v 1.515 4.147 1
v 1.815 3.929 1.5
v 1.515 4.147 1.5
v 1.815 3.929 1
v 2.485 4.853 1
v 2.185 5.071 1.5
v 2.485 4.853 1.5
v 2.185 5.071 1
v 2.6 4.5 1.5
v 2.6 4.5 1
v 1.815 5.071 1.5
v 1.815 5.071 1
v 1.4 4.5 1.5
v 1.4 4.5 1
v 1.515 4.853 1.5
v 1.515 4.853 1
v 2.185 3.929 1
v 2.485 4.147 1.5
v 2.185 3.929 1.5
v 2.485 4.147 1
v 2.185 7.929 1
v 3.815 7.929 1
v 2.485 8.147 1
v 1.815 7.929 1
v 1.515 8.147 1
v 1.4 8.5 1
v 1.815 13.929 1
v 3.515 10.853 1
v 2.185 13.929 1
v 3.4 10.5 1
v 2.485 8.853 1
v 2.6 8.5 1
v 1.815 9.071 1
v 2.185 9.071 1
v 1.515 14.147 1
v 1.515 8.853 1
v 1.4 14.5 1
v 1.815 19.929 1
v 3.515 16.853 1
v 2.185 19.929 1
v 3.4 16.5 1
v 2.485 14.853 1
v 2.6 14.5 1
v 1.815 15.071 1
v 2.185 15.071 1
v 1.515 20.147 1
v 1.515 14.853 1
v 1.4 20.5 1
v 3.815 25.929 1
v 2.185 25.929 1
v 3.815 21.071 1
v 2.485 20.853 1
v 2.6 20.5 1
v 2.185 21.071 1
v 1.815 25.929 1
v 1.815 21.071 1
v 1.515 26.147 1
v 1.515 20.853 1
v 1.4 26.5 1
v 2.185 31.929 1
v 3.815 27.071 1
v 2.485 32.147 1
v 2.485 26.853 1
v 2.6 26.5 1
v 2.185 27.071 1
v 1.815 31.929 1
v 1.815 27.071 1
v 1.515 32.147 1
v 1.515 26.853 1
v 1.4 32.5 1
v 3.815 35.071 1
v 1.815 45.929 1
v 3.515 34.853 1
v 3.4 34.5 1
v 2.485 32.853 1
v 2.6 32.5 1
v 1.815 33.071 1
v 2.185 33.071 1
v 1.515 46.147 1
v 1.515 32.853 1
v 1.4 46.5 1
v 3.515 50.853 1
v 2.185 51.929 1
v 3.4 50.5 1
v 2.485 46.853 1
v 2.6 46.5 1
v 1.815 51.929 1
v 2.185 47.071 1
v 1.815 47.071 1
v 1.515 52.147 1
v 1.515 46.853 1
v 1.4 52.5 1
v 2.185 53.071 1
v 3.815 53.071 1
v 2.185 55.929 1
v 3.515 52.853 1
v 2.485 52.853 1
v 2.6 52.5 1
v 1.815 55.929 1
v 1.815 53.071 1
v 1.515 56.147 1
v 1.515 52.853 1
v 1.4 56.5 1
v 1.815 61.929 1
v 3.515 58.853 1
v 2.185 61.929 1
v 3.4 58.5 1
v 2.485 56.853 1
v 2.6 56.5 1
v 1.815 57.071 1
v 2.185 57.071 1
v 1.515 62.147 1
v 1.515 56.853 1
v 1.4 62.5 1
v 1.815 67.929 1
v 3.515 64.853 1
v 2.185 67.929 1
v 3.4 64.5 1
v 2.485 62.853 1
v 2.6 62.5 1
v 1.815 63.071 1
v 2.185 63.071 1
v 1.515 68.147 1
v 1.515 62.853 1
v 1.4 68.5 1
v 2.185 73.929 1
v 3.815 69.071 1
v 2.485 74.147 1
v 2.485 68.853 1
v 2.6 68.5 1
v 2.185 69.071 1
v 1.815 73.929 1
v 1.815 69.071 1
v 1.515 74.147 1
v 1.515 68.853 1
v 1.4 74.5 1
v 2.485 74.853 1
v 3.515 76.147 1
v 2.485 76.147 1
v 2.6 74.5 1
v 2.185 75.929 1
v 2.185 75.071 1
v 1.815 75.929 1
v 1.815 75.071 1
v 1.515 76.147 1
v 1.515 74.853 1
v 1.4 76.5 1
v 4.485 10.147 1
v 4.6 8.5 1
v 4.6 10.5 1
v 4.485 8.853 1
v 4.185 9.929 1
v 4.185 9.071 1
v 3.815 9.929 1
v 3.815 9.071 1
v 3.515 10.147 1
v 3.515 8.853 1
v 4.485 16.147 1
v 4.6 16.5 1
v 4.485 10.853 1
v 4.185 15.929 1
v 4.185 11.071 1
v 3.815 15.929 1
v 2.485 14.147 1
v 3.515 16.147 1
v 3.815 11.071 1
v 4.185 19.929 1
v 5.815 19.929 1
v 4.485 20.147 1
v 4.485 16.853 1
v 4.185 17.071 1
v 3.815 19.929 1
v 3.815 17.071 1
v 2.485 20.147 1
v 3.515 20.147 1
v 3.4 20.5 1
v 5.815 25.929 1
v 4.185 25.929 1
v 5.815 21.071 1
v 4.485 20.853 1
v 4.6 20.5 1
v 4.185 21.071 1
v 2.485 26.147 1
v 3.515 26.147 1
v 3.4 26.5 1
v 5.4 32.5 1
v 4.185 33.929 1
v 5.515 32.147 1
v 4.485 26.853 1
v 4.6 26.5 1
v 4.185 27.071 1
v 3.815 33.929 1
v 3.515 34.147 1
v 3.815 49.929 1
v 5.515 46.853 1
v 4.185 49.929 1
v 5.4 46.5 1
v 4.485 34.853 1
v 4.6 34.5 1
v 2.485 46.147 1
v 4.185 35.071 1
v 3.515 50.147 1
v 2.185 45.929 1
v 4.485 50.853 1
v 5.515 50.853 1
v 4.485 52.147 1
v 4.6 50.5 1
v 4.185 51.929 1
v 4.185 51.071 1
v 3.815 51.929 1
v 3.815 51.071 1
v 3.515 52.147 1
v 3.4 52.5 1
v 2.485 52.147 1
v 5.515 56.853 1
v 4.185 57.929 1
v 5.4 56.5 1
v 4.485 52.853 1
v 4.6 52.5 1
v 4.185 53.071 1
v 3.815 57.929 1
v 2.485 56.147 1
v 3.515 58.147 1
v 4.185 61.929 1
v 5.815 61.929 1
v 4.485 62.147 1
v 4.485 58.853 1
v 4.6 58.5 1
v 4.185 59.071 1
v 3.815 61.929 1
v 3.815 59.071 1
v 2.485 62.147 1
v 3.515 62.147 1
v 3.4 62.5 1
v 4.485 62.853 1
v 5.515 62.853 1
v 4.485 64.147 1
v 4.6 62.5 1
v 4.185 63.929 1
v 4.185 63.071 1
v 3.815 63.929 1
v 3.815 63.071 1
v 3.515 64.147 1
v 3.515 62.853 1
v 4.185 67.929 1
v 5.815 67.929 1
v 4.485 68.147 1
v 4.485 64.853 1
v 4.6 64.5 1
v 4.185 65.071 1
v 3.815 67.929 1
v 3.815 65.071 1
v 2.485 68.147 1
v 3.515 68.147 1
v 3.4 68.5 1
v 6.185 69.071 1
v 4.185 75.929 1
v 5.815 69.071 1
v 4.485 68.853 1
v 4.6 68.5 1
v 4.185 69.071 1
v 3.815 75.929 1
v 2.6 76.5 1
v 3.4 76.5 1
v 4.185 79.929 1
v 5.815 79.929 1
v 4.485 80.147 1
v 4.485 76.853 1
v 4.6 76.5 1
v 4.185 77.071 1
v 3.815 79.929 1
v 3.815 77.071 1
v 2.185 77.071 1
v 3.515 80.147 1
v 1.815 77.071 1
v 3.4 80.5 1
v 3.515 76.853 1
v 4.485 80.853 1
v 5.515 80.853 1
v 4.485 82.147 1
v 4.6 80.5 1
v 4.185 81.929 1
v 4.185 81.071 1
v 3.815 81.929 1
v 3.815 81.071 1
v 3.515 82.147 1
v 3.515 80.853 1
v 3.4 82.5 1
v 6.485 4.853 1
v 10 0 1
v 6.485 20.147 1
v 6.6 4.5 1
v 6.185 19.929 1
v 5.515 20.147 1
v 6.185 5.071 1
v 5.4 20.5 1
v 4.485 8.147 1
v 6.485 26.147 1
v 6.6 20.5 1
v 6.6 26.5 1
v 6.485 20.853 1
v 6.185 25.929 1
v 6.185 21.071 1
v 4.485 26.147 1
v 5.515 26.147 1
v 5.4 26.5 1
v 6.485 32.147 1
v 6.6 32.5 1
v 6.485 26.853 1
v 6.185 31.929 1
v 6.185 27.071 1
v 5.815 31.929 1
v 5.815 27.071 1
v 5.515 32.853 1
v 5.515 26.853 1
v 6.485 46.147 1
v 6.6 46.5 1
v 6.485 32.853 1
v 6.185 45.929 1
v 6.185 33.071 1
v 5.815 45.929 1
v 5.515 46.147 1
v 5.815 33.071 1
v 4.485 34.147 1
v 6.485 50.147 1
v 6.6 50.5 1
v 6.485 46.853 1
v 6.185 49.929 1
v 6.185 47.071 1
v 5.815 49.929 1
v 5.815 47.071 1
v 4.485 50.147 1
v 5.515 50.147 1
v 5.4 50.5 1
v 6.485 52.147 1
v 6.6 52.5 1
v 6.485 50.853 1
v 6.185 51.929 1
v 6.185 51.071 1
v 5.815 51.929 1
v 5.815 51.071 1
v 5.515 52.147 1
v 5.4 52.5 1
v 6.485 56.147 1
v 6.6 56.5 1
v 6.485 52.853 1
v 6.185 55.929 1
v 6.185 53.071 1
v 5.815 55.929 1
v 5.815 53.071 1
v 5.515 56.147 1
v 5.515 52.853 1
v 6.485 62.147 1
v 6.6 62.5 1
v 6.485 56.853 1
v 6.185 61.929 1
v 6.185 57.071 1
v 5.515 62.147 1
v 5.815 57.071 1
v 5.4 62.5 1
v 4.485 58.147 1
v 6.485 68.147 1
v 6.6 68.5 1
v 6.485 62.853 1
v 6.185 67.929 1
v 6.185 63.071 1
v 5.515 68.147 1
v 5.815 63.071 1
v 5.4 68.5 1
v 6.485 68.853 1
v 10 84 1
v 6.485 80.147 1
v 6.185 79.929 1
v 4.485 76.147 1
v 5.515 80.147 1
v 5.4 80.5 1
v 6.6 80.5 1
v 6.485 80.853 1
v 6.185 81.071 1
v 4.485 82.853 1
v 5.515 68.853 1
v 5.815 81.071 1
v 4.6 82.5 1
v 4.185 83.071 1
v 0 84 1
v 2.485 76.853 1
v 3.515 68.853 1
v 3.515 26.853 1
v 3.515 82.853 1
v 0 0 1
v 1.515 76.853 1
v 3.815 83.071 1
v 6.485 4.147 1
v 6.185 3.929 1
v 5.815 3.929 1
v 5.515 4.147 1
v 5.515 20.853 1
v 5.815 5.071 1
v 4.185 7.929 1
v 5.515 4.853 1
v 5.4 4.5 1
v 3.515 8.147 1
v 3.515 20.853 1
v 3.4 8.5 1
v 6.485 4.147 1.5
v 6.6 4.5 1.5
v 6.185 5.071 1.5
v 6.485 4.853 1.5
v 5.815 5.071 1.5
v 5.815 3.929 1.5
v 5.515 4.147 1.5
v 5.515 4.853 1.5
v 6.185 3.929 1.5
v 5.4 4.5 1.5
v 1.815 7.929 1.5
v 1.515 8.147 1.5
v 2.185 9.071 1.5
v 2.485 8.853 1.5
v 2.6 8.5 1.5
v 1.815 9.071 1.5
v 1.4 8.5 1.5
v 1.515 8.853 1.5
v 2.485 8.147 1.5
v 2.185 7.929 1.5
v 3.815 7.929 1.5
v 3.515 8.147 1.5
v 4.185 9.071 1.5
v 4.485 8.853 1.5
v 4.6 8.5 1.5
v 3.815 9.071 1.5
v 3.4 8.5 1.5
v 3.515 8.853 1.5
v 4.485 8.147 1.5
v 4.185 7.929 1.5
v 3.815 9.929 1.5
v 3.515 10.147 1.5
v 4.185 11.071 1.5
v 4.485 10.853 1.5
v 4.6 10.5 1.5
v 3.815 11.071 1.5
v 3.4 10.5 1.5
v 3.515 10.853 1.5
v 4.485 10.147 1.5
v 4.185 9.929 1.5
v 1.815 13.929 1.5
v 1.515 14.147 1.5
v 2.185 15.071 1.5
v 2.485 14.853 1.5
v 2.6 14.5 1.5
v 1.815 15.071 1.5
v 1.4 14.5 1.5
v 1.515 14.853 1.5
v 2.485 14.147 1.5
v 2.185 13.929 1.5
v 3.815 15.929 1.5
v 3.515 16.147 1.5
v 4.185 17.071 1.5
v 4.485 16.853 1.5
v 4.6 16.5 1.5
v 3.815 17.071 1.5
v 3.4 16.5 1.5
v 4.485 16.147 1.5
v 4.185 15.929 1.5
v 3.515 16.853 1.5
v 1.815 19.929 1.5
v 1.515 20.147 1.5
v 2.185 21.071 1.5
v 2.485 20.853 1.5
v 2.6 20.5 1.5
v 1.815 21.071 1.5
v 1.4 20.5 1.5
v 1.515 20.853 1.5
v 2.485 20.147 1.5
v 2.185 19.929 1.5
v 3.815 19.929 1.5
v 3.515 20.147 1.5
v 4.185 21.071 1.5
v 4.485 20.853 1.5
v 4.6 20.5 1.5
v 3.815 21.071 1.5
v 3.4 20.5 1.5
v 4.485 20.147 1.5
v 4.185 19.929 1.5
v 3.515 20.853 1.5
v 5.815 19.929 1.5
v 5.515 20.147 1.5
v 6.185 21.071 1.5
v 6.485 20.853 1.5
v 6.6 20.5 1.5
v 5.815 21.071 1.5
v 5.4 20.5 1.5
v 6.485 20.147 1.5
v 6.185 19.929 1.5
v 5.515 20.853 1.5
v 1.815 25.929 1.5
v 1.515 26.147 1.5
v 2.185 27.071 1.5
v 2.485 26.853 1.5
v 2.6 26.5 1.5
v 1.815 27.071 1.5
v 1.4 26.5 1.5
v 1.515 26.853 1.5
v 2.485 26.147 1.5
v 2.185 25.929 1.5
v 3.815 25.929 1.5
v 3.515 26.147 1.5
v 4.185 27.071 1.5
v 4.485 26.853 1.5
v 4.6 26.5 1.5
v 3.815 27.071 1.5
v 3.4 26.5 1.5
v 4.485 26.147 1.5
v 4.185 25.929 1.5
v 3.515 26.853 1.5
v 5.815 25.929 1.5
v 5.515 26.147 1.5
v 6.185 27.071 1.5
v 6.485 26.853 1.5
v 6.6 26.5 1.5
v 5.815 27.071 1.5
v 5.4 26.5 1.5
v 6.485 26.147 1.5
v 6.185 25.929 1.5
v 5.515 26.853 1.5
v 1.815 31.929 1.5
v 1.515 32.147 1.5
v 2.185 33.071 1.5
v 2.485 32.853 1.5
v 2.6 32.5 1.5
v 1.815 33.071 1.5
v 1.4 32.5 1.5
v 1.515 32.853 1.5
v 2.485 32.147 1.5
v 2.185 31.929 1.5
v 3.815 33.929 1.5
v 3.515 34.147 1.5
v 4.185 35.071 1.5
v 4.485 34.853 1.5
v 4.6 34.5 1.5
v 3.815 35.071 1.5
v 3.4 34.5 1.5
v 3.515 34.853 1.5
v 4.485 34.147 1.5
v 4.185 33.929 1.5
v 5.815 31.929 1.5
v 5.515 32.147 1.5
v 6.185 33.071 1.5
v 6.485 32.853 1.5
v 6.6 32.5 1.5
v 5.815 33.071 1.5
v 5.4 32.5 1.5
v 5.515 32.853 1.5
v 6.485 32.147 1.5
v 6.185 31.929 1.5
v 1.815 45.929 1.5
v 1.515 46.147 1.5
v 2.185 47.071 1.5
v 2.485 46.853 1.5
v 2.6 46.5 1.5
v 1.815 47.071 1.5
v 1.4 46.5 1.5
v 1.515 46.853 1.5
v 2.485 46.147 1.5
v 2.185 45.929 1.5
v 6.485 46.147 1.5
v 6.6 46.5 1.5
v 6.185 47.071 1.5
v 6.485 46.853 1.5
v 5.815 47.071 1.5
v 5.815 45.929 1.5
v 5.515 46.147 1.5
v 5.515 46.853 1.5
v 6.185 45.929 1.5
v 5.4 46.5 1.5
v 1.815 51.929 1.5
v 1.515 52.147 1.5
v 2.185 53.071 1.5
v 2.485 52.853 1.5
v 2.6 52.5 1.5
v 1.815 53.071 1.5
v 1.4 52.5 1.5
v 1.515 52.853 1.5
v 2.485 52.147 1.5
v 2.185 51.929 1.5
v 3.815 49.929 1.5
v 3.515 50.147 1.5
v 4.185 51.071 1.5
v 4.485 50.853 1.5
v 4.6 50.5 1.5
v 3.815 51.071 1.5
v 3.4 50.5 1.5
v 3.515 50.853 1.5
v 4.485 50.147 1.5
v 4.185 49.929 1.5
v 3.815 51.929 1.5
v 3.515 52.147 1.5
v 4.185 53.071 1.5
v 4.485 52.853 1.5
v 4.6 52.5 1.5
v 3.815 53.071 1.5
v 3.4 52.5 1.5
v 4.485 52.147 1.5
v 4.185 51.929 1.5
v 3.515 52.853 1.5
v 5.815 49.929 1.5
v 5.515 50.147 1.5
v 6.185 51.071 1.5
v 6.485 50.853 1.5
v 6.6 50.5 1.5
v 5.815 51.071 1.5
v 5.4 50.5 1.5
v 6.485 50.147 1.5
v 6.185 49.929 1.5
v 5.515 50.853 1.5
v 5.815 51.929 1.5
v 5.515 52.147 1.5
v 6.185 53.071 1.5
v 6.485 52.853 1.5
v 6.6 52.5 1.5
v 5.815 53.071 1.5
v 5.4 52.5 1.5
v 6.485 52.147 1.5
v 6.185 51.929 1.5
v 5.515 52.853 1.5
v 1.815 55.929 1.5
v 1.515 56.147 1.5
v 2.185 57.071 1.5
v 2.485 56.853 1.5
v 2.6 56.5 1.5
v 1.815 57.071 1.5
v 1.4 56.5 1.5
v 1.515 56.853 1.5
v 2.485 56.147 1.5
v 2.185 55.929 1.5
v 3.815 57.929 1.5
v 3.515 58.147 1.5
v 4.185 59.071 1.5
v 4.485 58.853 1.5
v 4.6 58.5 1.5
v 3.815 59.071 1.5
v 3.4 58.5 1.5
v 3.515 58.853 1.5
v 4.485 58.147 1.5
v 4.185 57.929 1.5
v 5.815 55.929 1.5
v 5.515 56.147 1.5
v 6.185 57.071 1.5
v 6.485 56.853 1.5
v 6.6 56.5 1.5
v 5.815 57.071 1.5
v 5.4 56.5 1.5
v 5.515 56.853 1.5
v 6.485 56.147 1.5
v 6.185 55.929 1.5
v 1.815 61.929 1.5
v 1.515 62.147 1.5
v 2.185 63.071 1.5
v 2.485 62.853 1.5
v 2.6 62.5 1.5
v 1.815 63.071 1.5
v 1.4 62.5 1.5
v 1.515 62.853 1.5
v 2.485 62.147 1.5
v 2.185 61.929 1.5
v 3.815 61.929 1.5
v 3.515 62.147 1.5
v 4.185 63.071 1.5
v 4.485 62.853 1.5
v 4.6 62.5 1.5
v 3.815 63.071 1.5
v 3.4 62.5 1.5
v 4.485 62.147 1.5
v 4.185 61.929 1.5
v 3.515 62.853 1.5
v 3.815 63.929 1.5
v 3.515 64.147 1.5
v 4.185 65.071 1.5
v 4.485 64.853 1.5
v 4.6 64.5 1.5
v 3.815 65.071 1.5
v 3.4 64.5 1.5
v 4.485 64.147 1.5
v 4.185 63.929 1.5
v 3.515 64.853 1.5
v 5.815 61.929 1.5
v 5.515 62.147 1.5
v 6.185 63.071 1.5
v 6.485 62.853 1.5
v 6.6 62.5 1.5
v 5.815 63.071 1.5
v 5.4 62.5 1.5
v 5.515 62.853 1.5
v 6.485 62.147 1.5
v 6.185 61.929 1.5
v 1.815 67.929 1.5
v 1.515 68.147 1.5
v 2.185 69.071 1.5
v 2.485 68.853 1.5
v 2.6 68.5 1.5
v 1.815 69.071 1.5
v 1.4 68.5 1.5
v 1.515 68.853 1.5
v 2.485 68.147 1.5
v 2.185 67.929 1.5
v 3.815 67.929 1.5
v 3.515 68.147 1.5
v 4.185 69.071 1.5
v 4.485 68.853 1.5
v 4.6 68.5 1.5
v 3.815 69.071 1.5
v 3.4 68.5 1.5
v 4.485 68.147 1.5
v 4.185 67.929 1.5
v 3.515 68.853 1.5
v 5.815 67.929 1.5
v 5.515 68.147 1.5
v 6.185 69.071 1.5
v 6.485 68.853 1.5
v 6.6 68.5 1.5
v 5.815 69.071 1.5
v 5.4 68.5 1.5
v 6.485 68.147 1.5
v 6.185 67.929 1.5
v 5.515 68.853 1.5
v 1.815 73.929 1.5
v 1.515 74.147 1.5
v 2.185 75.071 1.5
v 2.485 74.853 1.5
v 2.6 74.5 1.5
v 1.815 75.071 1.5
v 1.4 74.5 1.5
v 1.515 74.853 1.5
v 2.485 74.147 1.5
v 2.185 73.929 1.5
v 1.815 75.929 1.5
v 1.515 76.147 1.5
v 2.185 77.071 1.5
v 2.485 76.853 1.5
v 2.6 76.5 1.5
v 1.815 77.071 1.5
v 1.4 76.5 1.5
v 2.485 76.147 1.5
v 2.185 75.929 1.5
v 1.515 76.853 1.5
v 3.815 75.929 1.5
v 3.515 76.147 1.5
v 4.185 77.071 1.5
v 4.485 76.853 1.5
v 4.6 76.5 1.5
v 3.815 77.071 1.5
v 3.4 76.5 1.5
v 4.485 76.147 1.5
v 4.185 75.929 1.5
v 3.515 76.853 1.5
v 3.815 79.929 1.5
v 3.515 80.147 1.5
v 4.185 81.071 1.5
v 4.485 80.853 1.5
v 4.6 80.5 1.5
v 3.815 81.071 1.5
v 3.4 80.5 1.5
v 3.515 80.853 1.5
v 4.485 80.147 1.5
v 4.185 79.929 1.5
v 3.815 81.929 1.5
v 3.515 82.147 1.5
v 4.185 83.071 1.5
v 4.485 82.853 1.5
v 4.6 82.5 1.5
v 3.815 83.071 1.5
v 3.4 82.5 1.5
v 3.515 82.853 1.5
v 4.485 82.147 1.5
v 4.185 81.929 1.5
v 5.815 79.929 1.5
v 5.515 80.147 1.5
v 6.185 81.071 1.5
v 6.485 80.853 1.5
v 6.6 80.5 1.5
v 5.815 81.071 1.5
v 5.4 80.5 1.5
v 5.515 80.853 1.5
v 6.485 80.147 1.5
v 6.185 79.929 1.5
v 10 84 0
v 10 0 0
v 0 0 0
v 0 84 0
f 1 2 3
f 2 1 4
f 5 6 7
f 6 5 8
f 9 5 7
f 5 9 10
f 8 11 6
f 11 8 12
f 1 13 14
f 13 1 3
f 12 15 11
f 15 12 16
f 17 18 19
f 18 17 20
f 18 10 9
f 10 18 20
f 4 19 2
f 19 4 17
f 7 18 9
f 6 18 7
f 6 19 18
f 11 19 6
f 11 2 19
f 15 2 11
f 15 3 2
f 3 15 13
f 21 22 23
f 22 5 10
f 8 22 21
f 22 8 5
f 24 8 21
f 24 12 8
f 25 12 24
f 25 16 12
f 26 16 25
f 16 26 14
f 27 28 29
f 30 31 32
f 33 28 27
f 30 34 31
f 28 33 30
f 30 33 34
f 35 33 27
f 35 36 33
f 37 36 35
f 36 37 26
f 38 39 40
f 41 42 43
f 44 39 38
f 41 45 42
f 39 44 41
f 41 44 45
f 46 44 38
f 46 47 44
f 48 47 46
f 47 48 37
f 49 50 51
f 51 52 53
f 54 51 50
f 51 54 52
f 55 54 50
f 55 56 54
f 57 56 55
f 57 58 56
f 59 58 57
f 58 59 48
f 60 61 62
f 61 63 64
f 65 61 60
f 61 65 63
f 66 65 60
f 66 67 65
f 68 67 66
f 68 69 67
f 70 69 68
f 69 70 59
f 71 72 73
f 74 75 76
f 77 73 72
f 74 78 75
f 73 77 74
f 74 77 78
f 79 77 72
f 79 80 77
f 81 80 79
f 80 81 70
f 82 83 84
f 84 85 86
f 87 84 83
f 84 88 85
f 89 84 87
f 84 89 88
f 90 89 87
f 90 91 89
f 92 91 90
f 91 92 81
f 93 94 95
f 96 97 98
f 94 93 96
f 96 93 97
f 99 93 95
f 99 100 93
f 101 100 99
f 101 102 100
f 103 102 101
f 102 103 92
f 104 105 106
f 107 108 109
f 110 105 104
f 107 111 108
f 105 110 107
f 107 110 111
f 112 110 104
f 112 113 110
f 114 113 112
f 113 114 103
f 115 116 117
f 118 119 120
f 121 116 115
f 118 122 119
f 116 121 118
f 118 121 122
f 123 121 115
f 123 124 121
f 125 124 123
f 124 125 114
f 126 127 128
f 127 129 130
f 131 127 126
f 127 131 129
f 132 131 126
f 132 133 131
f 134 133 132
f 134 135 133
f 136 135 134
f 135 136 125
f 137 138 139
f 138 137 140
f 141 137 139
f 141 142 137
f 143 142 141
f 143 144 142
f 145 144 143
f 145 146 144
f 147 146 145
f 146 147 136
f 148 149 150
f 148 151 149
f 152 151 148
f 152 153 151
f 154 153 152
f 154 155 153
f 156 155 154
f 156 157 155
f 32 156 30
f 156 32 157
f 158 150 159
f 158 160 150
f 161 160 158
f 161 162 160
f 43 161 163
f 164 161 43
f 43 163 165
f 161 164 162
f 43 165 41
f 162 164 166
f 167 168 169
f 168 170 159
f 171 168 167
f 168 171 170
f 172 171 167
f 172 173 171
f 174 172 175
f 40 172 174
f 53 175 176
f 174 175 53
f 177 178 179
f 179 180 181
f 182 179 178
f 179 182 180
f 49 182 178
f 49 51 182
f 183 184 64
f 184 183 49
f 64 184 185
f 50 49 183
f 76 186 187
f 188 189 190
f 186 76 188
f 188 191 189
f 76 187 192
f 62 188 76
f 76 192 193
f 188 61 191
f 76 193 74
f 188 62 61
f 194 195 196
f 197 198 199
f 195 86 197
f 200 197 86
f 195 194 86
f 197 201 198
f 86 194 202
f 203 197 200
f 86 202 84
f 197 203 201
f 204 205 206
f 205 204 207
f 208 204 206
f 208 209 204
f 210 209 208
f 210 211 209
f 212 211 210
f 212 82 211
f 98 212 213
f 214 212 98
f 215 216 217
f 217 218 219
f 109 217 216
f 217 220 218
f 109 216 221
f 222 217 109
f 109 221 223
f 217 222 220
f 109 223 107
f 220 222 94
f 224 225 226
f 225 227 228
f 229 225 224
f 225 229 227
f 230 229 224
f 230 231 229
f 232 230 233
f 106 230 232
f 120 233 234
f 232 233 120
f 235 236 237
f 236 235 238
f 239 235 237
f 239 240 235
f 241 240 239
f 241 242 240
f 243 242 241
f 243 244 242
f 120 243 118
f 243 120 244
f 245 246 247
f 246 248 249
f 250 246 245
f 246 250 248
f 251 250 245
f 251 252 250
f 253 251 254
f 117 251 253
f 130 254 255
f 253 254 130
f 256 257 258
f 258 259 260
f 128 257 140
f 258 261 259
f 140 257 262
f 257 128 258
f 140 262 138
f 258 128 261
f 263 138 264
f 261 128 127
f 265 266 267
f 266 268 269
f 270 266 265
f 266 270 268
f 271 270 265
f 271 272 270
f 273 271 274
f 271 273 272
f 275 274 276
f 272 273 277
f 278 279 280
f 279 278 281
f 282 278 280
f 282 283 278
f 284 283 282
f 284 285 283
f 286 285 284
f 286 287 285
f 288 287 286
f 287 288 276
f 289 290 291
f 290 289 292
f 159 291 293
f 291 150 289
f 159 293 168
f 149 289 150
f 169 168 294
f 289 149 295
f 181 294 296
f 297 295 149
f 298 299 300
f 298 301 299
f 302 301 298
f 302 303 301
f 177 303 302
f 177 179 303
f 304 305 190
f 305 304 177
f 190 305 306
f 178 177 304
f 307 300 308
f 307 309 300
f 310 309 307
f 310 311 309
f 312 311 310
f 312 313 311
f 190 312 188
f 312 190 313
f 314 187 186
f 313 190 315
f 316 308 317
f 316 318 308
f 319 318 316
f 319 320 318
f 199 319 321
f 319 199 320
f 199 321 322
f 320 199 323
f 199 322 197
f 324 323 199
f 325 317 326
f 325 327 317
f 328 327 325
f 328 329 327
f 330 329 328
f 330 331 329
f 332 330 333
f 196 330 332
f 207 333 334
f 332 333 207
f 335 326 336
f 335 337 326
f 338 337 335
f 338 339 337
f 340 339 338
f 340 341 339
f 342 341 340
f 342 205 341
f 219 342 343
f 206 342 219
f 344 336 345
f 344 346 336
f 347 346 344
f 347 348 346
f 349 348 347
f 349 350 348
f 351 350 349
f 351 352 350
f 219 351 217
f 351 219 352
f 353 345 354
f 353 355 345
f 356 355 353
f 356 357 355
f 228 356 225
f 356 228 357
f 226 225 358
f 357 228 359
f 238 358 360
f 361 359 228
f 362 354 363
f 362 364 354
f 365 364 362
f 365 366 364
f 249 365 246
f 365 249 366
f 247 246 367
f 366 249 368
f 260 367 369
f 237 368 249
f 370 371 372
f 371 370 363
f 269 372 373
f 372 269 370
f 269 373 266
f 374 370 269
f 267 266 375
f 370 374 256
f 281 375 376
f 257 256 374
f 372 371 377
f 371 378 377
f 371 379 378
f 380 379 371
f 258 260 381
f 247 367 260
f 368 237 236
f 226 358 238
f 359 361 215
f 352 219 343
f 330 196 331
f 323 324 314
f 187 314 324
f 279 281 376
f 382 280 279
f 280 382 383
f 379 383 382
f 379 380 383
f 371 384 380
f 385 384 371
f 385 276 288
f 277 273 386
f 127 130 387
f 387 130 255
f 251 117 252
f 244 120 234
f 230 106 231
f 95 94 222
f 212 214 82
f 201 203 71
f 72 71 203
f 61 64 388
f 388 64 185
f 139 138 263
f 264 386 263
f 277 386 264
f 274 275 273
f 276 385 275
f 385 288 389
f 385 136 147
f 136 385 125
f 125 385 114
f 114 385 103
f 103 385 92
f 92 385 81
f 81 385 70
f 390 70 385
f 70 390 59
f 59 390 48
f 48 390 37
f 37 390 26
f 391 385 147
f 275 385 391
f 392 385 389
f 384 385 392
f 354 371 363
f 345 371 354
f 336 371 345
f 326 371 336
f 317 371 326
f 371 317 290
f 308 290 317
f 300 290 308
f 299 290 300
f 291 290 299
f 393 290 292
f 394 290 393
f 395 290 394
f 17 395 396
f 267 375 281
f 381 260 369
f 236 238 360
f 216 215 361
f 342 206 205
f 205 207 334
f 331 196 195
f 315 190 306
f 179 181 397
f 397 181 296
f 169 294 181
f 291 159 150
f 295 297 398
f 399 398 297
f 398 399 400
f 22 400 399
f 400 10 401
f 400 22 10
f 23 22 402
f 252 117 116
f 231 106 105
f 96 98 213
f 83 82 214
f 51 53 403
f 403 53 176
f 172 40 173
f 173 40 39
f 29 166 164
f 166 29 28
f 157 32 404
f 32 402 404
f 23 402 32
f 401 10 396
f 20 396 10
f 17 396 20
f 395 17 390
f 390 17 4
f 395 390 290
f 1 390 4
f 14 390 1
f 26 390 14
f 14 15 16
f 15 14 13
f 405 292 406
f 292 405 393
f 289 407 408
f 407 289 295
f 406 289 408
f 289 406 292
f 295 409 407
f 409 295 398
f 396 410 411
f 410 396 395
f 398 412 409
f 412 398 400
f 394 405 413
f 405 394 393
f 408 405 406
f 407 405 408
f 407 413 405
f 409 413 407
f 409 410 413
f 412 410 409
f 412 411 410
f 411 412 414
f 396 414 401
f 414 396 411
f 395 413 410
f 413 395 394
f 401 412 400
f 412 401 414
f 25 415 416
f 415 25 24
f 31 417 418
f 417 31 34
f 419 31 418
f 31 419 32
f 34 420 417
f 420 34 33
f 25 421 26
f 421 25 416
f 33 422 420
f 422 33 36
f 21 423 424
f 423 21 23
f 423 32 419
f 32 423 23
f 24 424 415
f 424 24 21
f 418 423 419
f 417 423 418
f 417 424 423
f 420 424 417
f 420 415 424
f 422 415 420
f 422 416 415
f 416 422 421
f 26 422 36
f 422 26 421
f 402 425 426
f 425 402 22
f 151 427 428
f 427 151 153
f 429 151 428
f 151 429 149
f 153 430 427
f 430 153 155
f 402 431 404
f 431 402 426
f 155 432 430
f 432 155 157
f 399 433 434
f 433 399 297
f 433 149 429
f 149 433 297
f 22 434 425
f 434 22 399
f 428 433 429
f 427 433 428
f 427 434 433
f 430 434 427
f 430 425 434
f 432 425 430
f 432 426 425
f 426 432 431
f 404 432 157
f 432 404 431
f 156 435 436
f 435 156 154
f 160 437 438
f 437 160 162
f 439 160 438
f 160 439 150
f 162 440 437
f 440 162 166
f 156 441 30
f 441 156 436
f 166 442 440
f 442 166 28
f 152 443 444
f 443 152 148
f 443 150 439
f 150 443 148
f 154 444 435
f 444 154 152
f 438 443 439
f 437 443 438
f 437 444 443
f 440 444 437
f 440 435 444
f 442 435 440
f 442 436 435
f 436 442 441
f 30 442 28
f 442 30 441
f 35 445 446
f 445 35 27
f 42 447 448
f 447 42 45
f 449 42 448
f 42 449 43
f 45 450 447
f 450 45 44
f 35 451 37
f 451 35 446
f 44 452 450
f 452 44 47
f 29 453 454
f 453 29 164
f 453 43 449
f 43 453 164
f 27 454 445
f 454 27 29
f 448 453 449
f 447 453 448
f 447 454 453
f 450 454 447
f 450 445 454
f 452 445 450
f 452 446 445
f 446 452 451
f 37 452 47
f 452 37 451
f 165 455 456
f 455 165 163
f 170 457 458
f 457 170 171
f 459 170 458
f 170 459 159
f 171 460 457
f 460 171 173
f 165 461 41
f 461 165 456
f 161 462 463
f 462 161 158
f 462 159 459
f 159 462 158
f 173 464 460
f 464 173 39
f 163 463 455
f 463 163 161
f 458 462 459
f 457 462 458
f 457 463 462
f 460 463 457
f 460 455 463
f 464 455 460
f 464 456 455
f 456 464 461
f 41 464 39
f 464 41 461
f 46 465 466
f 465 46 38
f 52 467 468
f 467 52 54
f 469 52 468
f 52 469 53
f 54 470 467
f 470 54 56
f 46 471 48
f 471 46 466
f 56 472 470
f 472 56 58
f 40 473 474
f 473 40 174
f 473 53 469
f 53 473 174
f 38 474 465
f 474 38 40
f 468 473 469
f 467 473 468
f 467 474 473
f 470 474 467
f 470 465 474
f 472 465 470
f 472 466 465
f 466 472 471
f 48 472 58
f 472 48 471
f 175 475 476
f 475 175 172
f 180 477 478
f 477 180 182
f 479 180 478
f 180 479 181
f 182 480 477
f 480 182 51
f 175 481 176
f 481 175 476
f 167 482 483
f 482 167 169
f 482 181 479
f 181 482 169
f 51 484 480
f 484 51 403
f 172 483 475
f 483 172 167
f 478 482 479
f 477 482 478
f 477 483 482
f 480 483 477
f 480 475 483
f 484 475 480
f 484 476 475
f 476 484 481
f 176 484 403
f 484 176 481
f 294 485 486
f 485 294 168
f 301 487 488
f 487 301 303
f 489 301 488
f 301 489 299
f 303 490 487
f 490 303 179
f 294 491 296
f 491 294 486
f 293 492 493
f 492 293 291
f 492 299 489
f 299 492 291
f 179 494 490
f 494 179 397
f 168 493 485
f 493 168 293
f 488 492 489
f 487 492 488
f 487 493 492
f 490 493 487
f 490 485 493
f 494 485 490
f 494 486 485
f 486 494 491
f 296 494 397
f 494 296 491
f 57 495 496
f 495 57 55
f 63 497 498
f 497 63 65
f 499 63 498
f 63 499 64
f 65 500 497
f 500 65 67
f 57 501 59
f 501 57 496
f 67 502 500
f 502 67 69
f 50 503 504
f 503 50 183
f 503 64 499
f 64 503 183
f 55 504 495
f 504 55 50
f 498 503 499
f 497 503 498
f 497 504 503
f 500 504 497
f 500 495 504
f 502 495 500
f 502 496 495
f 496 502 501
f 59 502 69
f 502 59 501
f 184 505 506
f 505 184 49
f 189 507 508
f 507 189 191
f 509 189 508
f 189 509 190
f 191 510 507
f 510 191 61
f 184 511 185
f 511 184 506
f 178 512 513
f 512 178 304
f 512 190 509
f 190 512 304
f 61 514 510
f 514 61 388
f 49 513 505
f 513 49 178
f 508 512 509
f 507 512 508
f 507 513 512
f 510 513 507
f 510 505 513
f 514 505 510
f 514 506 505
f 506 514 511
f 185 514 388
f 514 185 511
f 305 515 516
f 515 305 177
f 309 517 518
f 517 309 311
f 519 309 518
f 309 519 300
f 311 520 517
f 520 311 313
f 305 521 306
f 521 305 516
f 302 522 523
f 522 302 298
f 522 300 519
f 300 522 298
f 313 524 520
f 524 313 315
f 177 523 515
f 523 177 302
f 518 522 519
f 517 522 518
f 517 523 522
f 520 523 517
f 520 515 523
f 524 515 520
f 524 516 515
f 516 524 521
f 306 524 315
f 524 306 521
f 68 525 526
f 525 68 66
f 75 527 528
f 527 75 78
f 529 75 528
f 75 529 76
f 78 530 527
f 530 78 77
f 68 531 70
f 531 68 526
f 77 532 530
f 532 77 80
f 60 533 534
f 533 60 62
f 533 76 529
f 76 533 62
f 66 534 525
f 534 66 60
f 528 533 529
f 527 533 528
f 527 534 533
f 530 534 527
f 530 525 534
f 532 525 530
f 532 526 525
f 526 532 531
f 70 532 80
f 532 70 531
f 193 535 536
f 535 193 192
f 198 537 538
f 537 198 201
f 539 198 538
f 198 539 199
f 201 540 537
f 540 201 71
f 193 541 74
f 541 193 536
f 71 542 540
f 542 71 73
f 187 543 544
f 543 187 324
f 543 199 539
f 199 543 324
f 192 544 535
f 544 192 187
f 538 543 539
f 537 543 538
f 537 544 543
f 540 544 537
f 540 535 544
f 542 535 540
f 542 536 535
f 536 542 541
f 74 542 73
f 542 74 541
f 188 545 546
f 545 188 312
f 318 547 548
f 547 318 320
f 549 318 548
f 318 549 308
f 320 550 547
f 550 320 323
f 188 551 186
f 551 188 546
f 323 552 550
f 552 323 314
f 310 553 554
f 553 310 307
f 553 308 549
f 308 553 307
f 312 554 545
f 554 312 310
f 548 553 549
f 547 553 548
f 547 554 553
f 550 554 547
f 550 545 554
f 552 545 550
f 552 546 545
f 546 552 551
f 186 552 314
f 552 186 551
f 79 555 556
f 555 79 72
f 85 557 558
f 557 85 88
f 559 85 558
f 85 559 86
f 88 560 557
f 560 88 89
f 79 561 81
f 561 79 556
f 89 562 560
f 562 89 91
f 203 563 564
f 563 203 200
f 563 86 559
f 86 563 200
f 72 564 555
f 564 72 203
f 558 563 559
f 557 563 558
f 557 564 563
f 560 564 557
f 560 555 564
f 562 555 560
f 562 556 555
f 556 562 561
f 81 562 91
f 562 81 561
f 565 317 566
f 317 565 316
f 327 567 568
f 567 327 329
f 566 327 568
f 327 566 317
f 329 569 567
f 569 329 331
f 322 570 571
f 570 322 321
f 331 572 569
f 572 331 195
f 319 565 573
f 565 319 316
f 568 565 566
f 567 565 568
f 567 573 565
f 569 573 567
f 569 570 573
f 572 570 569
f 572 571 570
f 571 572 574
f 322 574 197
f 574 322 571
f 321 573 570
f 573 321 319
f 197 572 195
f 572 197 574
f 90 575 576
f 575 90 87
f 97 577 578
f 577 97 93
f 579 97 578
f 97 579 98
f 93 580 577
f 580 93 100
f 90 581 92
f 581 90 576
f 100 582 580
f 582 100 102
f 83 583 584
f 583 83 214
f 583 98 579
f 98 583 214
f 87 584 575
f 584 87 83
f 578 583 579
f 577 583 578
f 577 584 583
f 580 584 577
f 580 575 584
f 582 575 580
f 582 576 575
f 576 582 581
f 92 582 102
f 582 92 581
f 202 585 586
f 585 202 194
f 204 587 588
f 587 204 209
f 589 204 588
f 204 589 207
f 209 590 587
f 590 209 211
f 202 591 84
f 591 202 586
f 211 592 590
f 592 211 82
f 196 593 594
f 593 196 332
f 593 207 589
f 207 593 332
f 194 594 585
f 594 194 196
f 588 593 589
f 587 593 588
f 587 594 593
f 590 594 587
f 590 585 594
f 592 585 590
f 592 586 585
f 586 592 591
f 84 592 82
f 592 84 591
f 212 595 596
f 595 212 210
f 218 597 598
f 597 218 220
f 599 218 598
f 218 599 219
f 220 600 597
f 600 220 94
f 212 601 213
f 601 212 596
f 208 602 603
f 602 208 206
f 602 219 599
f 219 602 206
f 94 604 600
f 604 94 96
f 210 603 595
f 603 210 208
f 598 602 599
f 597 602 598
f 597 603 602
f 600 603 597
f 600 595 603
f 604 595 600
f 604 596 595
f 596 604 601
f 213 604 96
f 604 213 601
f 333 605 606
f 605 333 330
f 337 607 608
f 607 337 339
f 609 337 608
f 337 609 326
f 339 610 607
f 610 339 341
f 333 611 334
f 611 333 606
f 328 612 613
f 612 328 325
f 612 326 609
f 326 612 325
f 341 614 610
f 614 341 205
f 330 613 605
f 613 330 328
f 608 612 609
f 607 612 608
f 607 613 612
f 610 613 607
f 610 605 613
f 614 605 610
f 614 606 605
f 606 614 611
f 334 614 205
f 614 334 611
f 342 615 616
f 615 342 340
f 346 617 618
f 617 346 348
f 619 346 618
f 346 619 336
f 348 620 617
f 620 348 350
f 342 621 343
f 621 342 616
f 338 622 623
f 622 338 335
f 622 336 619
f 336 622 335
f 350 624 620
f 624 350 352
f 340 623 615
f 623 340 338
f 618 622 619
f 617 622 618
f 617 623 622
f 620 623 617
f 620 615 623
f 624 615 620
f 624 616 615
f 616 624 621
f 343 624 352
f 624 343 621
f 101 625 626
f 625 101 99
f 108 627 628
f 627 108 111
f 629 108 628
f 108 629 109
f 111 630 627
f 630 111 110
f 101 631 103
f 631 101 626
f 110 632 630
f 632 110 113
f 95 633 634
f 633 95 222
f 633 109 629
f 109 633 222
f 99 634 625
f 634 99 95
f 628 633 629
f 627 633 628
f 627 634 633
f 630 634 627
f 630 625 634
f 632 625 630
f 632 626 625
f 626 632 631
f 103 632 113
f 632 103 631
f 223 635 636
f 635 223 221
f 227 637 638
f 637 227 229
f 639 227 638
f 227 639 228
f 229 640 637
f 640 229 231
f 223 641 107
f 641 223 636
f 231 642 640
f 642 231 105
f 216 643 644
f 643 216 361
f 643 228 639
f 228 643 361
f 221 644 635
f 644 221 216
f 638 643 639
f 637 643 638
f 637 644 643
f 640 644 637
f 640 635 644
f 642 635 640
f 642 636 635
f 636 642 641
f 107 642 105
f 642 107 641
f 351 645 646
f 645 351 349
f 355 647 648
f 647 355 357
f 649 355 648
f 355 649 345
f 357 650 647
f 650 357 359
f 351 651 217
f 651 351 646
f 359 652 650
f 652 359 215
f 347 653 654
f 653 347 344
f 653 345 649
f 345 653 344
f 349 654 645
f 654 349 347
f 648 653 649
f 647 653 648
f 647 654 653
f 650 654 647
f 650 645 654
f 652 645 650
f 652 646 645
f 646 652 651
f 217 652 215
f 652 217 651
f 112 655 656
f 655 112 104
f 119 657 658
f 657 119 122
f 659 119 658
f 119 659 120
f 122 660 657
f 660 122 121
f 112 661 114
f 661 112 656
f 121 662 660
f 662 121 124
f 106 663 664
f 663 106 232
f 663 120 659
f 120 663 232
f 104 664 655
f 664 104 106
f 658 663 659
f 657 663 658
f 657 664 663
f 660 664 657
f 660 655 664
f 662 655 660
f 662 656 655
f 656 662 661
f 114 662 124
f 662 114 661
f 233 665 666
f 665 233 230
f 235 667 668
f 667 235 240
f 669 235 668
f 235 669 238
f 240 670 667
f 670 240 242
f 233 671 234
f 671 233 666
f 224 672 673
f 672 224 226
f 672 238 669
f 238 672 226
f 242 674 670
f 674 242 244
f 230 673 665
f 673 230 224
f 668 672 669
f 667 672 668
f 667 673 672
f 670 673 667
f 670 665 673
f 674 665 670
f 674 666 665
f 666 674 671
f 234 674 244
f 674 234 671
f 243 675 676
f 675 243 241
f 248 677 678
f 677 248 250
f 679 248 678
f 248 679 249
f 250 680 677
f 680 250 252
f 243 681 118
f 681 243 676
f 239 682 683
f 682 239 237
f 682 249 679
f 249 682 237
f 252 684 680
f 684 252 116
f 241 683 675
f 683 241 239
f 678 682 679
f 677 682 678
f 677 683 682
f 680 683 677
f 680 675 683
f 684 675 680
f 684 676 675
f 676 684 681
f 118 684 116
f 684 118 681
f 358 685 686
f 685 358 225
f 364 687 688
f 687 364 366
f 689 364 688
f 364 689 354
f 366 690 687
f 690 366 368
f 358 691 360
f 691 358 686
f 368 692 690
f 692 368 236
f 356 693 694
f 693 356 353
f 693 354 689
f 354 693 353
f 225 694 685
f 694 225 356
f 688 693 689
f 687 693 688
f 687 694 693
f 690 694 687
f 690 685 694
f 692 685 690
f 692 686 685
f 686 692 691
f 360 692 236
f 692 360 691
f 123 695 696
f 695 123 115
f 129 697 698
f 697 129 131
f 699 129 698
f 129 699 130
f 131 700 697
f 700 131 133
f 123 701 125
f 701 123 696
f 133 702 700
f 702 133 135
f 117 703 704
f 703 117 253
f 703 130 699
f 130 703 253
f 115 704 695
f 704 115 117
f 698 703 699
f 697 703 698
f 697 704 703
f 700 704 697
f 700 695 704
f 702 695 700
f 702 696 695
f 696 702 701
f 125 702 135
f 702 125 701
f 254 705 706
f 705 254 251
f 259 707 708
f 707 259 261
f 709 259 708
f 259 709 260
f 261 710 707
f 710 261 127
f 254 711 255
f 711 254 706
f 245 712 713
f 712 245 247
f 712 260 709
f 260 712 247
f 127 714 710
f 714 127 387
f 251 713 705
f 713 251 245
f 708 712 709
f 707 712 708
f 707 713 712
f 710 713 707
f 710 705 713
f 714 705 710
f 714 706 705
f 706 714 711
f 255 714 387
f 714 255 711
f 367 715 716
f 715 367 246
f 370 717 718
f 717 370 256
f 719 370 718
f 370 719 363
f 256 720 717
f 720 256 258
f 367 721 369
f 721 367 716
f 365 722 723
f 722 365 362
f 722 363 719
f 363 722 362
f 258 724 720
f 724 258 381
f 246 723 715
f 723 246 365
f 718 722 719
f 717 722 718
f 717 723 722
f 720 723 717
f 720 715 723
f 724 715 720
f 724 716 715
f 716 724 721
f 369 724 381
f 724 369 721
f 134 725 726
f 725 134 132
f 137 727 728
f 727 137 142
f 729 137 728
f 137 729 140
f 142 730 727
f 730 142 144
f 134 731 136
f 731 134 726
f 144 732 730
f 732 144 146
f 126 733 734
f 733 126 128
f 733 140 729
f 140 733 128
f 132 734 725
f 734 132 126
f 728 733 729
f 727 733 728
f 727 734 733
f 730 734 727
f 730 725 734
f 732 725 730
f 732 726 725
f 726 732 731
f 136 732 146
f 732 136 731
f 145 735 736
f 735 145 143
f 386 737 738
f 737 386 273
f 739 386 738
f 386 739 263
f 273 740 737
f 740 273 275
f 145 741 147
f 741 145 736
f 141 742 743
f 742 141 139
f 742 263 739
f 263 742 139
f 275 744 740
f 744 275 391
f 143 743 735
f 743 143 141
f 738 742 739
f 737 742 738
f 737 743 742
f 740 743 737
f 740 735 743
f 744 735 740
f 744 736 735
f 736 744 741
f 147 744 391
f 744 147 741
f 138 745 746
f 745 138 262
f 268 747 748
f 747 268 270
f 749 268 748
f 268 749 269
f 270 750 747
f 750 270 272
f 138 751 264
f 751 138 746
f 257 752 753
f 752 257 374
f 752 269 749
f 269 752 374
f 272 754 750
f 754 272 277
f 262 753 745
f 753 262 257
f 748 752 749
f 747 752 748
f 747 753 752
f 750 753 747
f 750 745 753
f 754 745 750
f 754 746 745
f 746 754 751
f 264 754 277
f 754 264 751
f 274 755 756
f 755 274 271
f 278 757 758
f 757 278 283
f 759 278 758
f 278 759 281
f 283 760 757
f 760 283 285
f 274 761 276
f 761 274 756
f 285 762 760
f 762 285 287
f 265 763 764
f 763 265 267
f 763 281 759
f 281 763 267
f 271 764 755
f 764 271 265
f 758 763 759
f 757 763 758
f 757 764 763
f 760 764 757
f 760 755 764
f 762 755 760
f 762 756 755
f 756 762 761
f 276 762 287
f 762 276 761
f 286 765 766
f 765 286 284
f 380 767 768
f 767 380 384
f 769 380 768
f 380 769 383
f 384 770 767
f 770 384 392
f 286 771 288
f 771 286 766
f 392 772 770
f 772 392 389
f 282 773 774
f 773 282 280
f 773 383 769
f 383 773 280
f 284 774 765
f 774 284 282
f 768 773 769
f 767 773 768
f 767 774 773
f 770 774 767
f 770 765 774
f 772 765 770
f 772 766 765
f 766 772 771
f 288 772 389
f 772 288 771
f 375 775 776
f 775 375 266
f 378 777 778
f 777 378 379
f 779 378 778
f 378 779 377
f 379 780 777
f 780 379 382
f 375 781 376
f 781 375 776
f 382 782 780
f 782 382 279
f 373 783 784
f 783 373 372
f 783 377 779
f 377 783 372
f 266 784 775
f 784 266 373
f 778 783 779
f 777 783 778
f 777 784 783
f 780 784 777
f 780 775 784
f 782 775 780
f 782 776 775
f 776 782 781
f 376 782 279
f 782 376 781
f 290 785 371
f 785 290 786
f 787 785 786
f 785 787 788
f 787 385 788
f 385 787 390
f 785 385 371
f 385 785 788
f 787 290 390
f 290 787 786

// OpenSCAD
tabLowerCases = [
    ["a", [[1, 0,       0, 0,       0, 0]] ],
    ["b", [[1, 0,       1, 0,       0, 0]] ],
    ["C", [[1, 1,       0, 0,       0, 0]] ],
    ["d", [[1, 1,       0, 1,       0, 0]] ],
    ["e", [[1, 0,       0, 1,       0, 0]] ],
    ["f", [[1, 1,       0, 1,       0, 0]] ],
    ["g", [[1, 1,       1, 1,       0, 0]] ],
    ["h", [[1, 0,       1, 1,       0, 0]] ],
    ["i", [[0, 1,       1, 0,       0, 0]] ],
    ["j", [[0, 1,       1, 1,       0, 0]] ],
    ["k", [[1, 0,       0, 0,       1, 0]] ],
    ["l", [[1, 0,       1, 0,       1, 0]] ],
    ["m", [[1, 1,       0, 0,       1, 0]] ],
    ["n", [[1, 1,       0, 1,       1, 0]] ],
    ["o", [[1, 0,       0, 1,       1, 0]] ],
    ["p", [[1, 1,       1, 0,       1, 0]] ],
    ["q", [[1, 1,       1, 1,       1, 0]] ],
    ["r", [[1, 0,       1, 1,       1, 0]] ],
    ["s", [[0, 1,       1, 0,       1, 0]] ],
    ["t", [[0, 1,       1, 1,       1, 0]] ],
    ["u", [[1, 0,       0, 0,       1, 1]] ],
    ["v", [[1, 0,       1, 0,       1, 1]] ],
    ["w", [[0, 1,       1, 1,       1, 1]] ],
    ["x", [[1, 1,       0, 0,       1, 1]] ],
    ["y", [[1, 1,       0, 1,       1, 1]] ],
    ["z", [[1, 0,       0, 1,       1, 1]] ],
];

// uppercase characters
carMaj = [0, 1,       0, 0,       0, 1];
tabUppercases = [for(i = [0:25]) [chr(65+i), [carMaj, tabLowerCases[i][1][0] ] ]];
    
// other
// Source: https://fr.wikipedia.org/wiki/Braille
tabOthers = [
    [" ", [[0, 0,       0, 0,       0, 0]] ],

    // french accents
    ["à", [[1, 0,       1, 1,       1, 1]] ],
    ["â", [[1, 0,       0, 0,       0, 1]] ],
    ["ç", [[1, 1,       1, 0,       1, 1]] ],
    ["è", [[0, 1,       1, 0,       1, 1]] ],
    ["é", [[1, 1,       1, 1,       1, 1]] ],
    ["ê", [[1, 0,       1, 0,       0, 1]] ],
    ["ë", [[1, 1,       1, 0,       0, 1]] ],
    ["î", [[1, 1,       0, 0,       0, 1]] ],
    ["ï", [[1, 1,       1, 1,       0, 1]] ],
    ["ô", [[1, 1,       0, 1,       0, 1]] ],
    ["œ", [[0, 1,       1, 0,       0, 1]] ],
    ["ù", [[0, 1,       1, 1,       1, 1]] ],
    ["û", [[1, 0,       0, 1,       0, 1]] ],
    ["ü", [[1, 0,       1, 1,       0, 1]] ],
    
    // ponctuation
    [".", [[0, 0,       1, 1,       0, 1]] ],
    [",", [[0, 0,       1, 0,       0, 0]] ],
    ["?", [[0, 0,       1, 0,       0, 1]] ],
    [";", [[0, 0,       1, 0,       1, 0]] ],
    [":", [[0, 0,       1, 1,       0, 0]] ],
    ["!", [[0, 0,       1, 1,       1, 0]] ],
    ["(", [[0, 0,       1, 0,       1, 1]] ],
    [")", [[0, 0,       0, 1,       1, 1]] ],
    ["\"", [[0, 0,       1, 1,       1, 1]] ],
    ["-", [[0, 0,       0, 0,       1, 1]] ],
    ["'", [[0, 0,       0, 0,       1, 0]] ],
    
    // special characters
    ["§", [[0, 0,       0, 1,       0, 0], 
           [1, 1,       1, 0,       1, 0]] ],
    ["&", [[0, 0,       0, 1,       0, 0], 
           [1, 1,       1, 1,       1, 1]] ],
    ["¥", [[0, 1,       0, 1,       0, 0], 
           [1, 1,       0, 1,       1, 1]] ],
    ["€", [[0, 1,       0, 1,       0, 0], 
           [1, 0,       0, 1,       0, 0]] ],
    ["$", [[0, 1,       0, 1,       0, 0], 
           [0, 1,       1, 0,       1, 0]] ],
    ["£", [[0, 1,       0, 1,       0, 0], 
           [1, 0,       1, 0,       1, 0]] ],
    ["©", [[0, 0,       0, 1,       0, 0], 
           [1, 1,       0, 0,       0, 0]] ],
    ["®", [[0, 0,       0, 1,       0, 0], 
           [1, 1,       1, 0,       1, 0]] ],
    ["™", [[0, 0,       0, 1,       0, 0], 
           [1, 0,       1, 1,       1, 0]] ],
    ["%", [[0, 0,       0, 1,       0, 0], 
           [0, 1,       0, 0,       1, 1]] ],
    ["‰", [[0, 0,       0, 1,       0, 0], 
           [0, 1,       0, 0,       1, 1],
           [0, 1,       0, 0,       1, 1]] ],
    ["‱", [[0, 0,       0, 1,       0, 0], 
           [0, 1,       0, 0,       1, 1],
           [0, 1,       0, 0,       1, 1],
           [0, 1,       0, 0,       1, 1]] ],
    
];

tabAllSigns = concat(tabLowerCases, tabUppercases, tabOthers);

// transform tab of indices into braille signs
function getBrailleSigns(tabIndices, i, result = []) = 
    (i == len(tabIndices) 
        ? result 
        : concat(tabAllSigns[tabIndices[i]][1], 
                 getBrailleSigns(tabIndices, i+1, result)
          )
    );


module writeBrailleDots(dots, d = 1.2, h = 0.5) {
    posX = [2, 2, 4, 4, 6, 6];
    posY = [2.5, 4.5, 2.5, 4.5, 2.5, 4.5];

    for ( i = [0:5] ) {
        if (dots[i] == 1) 
            translate([posX[i], posY[i], 0]) 
                cylinder(d=d, h=h, $fn = 10);
    }

}

// default char size
defaultCharWidth = 6;
defaultCharHeight = 10;

module text2braille(text, w=defaultCharWidth, h=defaultCharHeight) {
    // get indices for each characters
    brailleSignsIndices = search(text, tabAllSigns);

    // get braille characters from indices
    brailleSigns = getBrailleSigns(brailleSignsIndices, 0);

    echo(str("Resultat Braille : ", brailleSigns));
    echo(str("Nombre de caractères : ", len(text)));
    echo(str("Nombre de caractères braille: ", len(brailleSigns)));
    
    hBase = 1;
    
    // basement
    cube([h, w * len(brailleSigns), hBase]);
    
    // dots
    for (i = [0:len(brailleSigns) - 1]) {
        translate([0, w * i, hBase]) 
            writeBrailleDots(brailleSigns[i]);
        echo("Caractère braille : ", i, " - ", brailleSigns[i]);
    }
}


module textList2Braille(textList,
        w=defaultCharWidth,
        h=defaultCharHeight) {

    for (i = [0, len(textList) -1]) {
        translate([i * h, 0, 0])
            text2braille(textList[i], w=w, h=h);
    }
}

text2braille("Hello World!");

//translate([2 * defaultCharHeight, 0, 0])
//    textList2Braille(["Bonjour", "les copains !"]);
